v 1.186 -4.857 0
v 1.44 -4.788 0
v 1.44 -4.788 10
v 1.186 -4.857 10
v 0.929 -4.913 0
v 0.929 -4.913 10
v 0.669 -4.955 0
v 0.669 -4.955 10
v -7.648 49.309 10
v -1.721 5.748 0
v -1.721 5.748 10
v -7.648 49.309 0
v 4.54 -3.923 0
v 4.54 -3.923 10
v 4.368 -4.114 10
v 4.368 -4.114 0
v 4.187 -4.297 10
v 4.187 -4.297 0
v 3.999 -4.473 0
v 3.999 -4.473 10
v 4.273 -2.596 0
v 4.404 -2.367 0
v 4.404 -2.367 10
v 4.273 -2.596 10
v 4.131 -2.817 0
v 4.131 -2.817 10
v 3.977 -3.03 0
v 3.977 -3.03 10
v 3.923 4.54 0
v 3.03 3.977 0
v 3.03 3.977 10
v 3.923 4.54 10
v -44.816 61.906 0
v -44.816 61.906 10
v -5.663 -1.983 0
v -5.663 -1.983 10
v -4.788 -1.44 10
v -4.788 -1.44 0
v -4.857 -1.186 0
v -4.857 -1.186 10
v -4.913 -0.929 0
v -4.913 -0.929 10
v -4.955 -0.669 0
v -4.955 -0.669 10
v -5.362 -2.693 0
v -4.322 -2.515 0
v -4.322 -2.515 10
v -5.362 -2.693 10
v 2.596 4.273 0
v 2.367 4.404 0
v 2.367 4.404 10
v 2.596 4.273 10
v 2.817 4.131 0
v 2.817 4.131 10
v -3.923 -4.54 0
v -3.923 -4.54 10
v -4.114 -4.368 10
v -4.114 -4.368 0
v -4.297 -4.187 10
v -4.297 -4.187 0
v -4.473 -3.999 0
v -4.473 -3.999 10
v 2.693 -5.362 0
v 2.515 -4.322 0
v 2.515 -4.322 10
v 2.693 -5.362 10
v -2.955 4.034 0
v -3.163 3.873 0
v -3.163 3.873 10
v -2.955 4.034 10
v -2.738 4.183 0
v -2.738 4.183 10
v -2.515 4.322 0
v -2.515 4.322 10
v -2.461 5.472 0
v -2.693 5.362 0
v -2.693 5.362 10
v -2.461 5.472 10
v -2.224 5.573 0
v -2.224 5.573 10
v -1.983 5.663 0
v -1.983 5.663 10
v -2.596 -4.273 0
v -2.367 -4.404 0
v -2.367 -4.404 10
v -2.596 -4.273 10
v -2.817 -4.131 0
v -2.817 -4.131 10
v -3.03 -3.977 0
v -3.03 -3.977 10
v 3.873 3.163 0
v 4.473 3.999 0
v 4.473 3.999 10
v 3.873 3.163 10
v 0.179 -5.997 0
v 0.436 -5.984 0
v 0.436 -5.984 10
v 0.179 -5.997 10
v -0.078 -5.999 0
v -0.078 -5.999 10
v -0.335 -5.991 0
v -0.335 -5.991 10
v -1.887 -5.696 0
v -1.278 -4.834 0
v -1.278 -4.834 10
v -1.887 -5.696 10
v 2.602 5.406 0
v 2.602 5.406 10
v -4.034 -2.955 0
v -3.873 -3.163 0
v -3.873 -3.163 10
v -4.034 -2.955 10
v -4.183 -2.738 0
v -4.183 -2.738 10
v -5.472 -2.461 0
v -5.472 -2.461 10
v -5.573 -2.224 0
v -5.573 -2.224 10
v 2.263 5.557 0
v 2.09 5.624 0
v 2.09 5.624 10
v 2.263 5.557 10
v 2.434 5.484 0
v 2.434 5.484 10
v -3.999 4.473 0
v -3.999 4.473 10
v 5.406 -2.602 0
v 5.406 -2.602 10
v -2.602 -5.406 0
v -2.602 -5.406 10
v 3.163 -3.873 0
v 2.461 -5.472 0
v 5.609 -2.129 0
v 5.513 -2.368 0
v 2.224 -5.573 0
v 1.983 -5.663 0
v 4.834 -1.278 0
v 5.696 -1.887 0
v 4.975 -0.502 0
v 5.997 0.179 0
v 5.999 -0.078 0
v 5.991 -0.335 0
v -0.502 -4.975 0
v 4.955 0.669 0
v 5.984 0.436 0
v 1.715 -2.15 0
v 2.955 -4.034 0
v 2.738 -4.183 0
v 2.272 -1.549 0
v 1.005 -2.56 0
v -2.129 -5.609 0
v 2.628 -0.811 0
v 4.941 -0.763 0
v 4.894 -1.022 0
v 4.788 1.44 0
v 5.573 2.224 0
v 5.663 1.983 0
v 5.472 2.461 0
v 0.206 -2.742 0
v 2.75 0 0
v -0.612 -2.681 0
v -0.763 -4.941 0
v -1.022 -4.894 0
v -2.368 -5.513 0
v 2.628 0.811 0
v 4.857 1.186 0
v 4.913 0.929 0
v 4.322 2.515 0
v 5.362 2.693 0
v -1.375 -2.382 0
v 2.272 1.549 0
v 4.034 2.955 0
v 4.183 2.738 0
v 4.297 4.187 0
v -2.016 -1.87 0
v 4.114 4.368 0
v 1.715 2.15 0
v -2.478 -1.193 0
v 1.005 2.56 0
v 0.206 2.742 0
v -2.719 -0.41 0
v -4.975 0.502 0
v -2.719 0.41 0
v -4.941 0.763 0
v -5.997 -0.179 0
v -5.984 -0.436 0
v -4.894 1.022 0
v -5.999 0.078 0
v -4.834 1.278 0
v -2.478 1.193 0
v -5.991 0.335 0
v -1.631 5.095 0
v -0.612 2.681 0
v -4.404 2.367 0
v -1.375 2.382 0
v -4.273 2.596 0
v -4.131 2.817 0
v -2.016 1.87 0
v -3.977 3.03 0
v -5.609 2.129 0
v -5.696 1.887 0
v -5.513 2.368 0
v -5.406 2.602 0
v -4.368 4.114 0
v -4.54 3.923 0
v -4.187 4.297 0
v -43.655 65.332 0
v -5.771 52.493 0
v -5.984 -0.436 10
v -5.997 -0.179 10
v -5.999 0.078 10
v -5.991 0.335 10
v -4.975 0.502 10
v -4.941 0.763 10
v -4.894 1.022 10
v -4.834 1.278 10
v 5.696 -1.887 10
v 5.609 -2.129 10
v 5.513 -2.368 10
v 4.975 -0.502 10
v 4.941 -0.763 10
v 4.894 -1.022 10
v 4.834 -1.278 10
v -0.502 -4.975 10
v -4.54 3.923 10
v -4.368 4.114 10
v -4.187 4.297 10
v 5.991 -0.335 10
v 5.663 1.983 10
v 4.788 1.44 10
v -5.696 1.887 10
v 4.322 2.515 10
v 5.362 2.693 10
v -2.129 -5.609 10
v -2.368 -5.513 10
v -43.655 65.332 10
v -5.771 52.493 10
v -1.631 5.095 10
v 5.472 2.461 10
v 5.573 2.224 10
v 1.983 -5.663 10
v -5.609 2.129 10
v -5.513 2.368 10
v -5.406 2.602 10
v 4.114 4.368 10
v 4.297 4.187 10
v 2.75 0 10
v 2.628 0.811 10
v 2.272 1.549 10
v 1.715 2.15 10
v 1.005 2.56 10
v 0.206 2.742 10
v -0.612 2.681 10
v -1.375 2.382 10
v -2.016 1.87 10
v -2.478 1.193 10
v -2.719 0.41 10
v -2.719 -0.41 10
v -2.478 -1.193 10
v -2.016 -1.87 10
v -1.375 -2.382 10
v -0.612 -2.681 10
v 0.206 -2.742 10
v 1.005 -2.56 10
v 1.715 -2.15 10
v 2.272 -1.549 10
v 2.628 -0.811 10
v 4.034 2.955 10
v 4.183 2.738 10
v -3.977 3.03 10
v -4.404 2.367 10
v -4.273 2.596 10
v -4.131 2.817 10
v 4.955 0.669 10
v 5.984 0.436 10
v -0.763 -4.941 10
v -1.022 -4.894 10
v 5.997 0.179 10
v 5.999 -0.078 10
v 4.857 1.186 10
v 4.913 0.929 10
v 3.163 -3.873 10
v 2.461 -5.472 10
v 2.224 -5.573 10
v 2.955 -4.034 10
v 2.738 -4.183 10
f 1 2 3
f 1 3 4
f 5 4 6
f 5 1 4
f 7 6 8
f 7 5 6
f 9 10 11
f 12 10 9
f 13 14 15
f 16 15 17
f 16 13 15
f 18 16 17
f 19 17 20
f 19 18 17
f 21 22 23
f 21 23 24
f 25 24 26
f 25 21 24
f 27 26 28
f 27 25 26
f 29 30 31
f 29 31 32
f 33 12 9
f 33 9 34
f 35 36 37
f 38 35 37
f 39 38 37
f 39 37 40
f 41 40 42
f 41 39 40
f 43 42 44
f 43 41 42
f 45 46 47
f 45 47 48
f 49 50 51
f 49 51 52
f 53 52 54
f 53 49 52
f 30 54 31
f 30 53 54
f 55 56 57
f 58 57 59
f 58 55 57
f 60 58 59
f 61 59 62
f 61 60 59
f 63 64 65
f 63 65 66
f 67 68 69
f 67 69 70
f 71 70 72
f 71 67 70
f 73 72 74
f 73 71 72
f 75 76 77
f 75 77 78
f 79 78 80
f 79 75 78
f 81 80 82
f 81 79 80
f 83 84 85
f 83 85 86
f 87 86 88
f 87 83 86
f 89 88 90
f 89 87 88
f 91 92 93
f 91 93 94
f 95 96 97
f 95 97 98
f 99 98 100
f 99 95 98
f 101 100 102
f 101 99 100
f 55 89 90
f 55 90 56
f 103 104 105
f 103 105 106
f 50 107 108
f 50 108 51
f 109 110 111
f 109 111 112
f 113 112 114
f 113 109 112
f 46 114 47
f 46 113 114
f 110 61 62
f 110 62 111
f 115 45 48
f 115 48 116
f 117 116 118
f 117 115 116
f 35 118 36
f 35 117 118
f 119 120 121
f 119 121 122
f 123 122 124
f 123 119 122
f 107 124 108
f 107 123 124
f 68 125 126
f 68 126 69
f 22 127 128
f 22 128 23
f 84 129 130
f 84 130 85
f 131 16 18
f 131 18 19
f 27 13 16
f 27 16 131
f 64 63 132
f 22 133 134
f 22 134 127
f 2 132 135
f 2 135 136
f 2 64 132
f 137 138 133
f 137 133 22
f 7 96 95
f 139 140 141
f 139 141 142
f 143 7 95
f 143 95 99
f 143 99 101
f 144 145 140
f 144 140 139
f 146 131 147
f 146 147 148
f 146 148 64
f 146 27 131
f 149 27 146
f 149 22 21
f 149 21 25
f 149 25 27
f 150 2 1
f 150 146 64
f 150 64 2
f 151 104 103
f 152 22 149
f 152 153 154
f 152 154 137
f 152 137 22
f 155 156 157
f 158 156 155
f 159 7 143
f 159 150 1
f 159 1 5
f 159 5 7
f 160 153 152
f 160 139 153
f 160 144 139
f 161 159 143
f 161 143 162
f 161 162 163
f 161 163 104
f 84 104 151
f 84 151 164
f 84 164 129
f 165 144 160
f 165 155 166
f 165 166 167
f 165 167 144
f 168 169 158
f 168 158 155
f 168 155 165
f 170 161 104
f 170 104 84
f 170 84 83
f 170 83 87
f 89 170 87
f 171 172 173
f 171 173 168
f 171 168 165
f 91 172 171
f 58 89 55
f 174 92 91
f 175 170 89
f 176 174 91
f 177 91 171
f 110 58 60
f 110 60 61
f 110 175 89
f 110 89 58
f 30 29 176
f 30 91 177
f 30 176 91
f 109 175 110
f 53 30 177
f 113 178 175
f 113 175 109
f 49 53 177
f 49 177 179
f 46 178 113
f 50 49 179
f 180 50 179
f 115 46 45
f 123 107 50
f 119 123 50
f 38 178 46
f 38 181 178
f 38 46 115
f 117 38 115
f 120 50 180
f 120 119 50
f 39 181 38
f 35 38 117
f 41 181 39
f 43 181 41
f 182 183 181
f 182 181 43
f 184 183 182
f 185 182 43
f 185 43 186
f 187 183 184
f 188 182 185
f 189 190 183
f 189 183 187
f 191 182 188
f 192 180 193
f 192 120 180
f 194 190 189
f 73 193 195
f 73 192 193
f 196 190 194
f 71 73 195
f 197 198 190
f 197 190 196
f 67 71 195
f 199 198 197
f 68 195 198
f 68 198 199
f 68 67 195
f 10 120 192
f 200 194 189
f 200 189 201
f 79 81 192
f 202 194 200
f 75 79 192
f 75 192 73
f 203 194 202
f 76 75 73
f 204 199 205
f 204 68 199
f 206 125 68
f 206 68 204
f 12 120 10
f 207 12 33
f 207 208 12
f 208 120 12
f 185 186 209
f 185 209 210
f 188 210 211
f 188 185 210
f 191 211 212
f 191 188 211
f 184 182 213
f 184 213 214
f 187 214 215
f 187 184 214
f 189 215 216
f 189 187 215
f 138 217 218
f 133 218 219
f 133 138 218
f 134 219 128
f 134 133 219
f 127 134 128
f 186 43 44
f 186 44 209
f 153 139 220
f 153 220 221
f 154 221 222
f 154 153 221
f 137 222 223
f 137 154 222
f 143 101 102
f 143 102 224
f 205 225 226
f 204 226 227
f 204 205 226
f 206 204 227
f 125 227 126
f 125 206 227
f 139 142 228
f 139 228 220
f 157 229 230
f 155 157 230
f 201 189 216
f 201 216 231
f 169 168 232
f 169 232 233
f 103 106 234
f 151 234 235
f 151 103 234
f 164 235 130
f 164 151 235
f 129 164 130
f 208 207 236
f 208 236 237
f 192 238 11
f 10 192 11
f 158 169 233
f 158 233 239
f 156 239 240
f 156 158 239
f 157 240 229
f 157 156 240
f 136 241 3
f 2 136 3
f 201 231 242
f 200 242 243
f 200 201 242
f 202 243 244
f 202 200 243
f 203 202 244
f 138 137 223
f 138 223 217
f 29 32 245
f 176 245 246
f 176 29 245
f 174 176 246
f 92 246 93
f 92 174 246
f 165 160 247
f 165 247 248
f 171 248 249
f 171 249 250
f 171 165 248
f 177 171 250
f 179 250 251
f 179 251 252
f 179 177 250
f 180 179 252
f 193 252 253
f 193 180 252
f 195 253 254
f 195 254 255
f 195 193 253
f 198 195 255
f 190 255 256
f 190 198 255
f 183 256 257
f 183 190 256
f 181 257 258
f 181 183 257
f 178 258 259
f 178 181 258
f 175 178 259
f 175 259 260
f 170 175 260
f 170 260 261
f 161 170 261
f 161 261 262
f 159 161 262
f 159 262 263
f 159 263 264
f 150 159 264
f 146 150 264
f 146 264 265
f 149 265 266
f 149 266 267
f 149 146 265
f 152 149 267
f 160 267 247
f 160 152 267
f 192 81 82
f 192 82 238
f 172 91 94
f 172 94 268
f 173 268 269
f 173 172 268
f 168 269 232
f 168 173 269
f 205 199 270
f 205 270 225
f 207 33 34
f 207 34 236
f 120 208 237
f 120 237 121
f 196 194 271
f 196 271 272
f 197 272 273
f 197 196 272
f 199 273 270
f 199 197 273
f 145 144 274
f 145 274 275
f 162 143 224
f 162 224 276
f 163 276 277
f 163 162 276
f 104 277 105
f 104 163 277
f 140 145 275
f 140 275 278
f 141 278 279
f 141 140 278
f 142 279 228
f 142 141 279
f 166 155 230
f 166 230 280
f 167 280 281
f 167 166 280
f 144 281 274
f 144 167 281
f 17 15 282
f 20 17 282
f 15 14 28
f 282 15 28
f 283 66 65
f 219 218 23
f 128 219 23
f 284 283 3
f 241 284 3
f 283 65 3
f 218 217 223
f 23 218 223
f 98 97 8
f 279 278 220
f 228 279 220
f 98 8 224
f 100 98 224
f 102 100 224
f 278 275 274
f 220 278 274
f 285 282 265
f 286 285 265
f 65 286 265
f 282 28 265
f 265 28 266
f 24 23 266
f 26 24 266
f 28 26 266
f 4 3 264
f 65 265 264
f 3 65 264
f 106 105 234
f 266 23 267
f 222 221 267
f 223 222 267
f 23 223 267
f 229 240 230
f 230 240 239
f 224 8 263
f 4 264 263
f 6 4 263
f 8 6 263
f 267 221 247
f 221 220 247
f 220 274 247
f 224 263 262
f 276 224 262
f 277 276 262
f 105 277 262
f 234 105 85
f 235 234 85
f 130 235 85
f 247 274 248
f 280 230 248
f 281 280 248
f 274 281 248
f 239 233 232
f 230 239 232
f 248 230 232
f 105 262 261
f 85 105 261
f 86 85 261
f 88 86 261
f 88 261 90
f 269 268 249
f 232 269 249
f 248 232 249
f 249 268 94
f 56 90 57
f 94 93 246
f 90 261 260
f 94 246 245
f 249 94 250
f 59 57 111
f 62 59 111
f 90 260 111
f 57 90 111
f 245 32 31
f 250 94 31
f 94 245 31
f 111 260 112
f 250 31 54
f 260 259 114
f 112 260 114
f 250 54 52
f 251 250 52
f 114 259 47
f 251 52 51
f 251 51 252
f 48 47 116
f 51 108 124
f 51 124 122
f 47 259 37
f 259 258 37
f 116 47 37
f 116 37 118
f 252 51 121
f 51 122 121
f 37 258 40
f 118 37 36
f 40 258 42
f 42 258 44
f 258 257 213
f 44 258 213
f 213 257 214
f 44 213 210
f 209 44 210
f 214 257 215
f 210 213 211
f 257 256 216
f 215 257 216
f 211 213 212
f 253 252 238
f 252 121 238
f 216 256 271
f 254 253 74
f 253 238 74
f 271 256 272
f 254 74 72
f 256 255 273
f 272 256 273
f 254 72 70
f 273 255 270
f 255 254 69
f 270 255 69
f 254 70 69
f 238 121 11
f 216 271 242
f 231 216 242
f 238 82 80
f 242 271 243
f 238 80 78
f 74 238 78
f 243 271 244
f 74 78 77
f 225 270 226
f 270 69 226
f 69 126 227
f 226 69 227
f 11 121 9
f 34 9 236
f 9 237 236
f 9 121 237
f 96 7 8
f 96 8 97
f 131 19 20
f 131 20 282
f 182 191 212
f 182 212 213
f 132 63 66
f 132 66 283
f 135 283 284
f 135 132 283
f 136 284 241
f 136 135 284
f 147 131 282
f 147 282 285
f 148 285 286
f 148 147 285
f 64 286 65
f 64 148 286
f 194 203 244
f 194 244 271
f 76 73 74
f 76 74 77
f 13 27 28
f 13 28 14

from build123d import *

# Parameters (mm, degrees)
SKETCH1_R           = 2.75
BOSS_EXTRUDE1_DEPTH = 10


with BuildPart() as part:
    # Sketch1 → Boss-Extrude1 (new body)
    with BuildSketch(Plane.XY):
        with BuildLine():
            Line((-5.771263161, 52.493232874), (2.09039449, 5.62407778))
            ThreePointArc((2.09039449, 5.62407778), (2.348768815, 5.521167001), (2.602096685, 5.4063937))
            Line((2.602096685, 5.4063937), (2.367387425, 4.404029607))
            ThreePointArc((2.367387425, 4.404029607), (2.707371965, 4.203586212), (3.030487733, 3.976951609))
            Line((3.030487733, 3.976951609), (3.922838506, 4.539971151))
            ThreePointArc((3.922838506, 4.539971151), (4.206602502, 4.278375322), (4.472961167, 3.999077193))
            Line((4.472961167, 3.999077193), (3.872529953, 3.162832869))
            ThreePointArc((3.872529953, 3.162832869), (4.109928346, 2.847540868), (4.321719082, 2.514506746))
            Line((4.321719082, 2.514506746), (5.361601948, 2.693181121))
            ThreePointArc((5.361601948, 2.693181121), (5.523657306, 2.342906308), (5.662857859, 1.982937436))
            Line((5.662857859, 1.982937436), (4.788114901, 1.440123498))
            ThreePointArc((4.788114901, 1.440123498), (4.886785392, 1.05798324), (4.955007877, 0.669251025))
            Line((4.955007877, 0.669251025), (5.984110097, 0.436378678))
            ThreePointArc((5.984110097, 0.436378678), (5.999785357, 0.050751048), (5.990635775, -0.335086571))
            Line((5.990635775, -0.335086571), (4.97475276, -0.501831621))
            ThreePointArc((4.97475276, -0.501831621), (4.919673661, -0.892642746), (4.833941641, -1.277892098))
            Line((4.833941641, -1.277892098), (5.695591729, -1.886858462))
            ThreePointArc((5.695591729, -1.886858462), (5.562500476, -2.2491306), (5.4063937, -2.602096685))
            Line((5.4063937, -2.602096685), (4.404029607, -2.367387425))
            ThreePointArc((4.404029607, -2.367387425), (4.203586212, -2.707371965), (3.976951609, -3.030487733))
            Line((3.976951609, -3.030487733), (4.539971151, -3.922838506))
            ThreePointArc((4.539971151, -3.922838506), (4.278375322, -4.206602502), (3.999077193, -4.472961167))
            Line((3.999077193, -4.472961167), (3.162832869, -3.872529953))
            ThreePointArc((3.162832869, -3.872529953), (2.847540868, -4.109928346), (2.514506746, -4.321719082))
            Line((2.514506746, -4.321719082), (2.693181121, -5.361601948))
            ThreePointArc((2.693181121, -5.361601948), (2.342906308, -5.523657306), (1.982937436, -5.662857859))
            Line((1.982937436, -5.662857859), (1.440123498, -4.788114901))
            ThreePointArc((1.440123498, -4.788114901), (1.05798324, -4.886785392), (0.669251025, -4.955007877))
            Line((0.669251025, -4.955007877), (0.436378678, -5.984110097))
            ThreePointArc((0.436378678, -5.984110097), (0.050751048, -5.999785357), (-0.335086571, -5.990635775))
            Line((-0.335086571, -5.990635775), (-0.501831621, -4.97475276))
            ThreePointArc((-0.501831621, -4.97475276), (-0.892642746, -4.919673661), (-1.277892098, -4.833941641))
            Line((-1.277892098, -4.833941641), (-1.886858462, -5.695591729))
            ThreePointArc((-1.886858462, -5.695591729), (-2.2491306, -5.562500476), (-2.602096685, -5.4063937))
            Line((-2.602096685, -5.4063937), (-2.367387425, -4.404029607))
            ThreePointArc((-2.367387425, -4.404029607), (-2.707371965, -4.203586212), (-3.030487733, -3.976951609))
            Line((-3.030487733, -3.976951609), (-3.922838506, -4.539971151))
            ThreePointArc((-3.922838506, -4.539971151), (-4.206602502, -4.278375322), (-4.472961167, -3.999077193))
            Line((-4.472961167, -3.999077193), (-3.872529953, -3.162832869))
            ThreePointArc((-3.872529953, -3.162832869), (-4.109928346, -2.847540868), (-4.321719082, -2.514506746))
            Line((-4.321719082, -2.514506746), (-5.361601948, -2.693181121))
            ThreePointArc((-5.361601948, -2.693181121), (-5.523657306, -2.342906308), (-5.662857859, -1.982937436))
            Line((-5.662857859, -1.982937436), (-4.788114901, -1.440123498))
            ThreePointArc((-4.788114901, -1.440123498), (-4.886785392, -1.05798324), (-4.955007877, -0.669251025))
            Line((-4.955007877, -0.669251025), (-5.984110097, -0.436378678))
            ThreePointArc((-5.984110097, -0.436378678), (-5.999785357, -0.050751048), (-5.990635775, 0.335086571))
            Line((-5.990635775, 0.335086571), (-4.97475276, 0.501831621))
            ThreePointArc((-4.97475276, 0.501831621), (-4.919673661, 0.892642746), (-4.833941641, 1.277892098))
            Line((-4.833941641, 1.277892098), (-5.695591729, 1.886858462))
            ThreePointArc((-5.695591729, 1.886858462), (-5.562500476, 2.2491306), (-5.4063937, 2.602096685))
            Line((-5.4063937, 2.602096685), (-4.404029607, 2.367387425))
            ThreePointArc((-4.404029607, 2.367387425), (-4.203586212, 2.707371965), (-3.976951609, 3.030487733))
            Line((-3.976951609, 3.030487733), (-4.539971151, 3.922838506))
            ThreePointArc((-4.539971151, 3.922838506), (-4.278375322, 4.206602502), (-3.999077193, 4.472961167))
            Line((-3.999077193, 4.472961167), (-3.162832869, 3.872529953))
            ThreePointArc((-3.162832869, 3.872529953), (-2.847540868, 4.109928346), (-2.514506746, 4.321719082))
            Line((-2.514506746, 4.321719082), (-2.693181121, 5.361601948))
            ThreePointArc((-2.693181121, 5.361601948), (-2.342906308, 5.523657306), (-1.982937436, 5.662857859))
            Line((-1.982937436, 5.662857859), (-1.630850624, 5.095471066))
            Line((-1.630850624, 5.095471066), (-1.721009902, 5.747880037))
            Line((-1.721009902, 5.747880037), (-7.647759844, 49.309063447))
            Line((-7.647759844, 49.309063447), (-44.816075509, 61.905592465))
            Line((-44.816075509, 61.905592465), (-43.65479695, 65.33215291))
            Line((-43.65479695, 65.33215291), (-5.771263161, 52.493232874))
        make_face()
        Circle(SKETCH1_R, mode=Mode.SUBTRACT)
    extrude(amount=BOSS_EXTRUDE1_DEPTH)


solid = part.part
